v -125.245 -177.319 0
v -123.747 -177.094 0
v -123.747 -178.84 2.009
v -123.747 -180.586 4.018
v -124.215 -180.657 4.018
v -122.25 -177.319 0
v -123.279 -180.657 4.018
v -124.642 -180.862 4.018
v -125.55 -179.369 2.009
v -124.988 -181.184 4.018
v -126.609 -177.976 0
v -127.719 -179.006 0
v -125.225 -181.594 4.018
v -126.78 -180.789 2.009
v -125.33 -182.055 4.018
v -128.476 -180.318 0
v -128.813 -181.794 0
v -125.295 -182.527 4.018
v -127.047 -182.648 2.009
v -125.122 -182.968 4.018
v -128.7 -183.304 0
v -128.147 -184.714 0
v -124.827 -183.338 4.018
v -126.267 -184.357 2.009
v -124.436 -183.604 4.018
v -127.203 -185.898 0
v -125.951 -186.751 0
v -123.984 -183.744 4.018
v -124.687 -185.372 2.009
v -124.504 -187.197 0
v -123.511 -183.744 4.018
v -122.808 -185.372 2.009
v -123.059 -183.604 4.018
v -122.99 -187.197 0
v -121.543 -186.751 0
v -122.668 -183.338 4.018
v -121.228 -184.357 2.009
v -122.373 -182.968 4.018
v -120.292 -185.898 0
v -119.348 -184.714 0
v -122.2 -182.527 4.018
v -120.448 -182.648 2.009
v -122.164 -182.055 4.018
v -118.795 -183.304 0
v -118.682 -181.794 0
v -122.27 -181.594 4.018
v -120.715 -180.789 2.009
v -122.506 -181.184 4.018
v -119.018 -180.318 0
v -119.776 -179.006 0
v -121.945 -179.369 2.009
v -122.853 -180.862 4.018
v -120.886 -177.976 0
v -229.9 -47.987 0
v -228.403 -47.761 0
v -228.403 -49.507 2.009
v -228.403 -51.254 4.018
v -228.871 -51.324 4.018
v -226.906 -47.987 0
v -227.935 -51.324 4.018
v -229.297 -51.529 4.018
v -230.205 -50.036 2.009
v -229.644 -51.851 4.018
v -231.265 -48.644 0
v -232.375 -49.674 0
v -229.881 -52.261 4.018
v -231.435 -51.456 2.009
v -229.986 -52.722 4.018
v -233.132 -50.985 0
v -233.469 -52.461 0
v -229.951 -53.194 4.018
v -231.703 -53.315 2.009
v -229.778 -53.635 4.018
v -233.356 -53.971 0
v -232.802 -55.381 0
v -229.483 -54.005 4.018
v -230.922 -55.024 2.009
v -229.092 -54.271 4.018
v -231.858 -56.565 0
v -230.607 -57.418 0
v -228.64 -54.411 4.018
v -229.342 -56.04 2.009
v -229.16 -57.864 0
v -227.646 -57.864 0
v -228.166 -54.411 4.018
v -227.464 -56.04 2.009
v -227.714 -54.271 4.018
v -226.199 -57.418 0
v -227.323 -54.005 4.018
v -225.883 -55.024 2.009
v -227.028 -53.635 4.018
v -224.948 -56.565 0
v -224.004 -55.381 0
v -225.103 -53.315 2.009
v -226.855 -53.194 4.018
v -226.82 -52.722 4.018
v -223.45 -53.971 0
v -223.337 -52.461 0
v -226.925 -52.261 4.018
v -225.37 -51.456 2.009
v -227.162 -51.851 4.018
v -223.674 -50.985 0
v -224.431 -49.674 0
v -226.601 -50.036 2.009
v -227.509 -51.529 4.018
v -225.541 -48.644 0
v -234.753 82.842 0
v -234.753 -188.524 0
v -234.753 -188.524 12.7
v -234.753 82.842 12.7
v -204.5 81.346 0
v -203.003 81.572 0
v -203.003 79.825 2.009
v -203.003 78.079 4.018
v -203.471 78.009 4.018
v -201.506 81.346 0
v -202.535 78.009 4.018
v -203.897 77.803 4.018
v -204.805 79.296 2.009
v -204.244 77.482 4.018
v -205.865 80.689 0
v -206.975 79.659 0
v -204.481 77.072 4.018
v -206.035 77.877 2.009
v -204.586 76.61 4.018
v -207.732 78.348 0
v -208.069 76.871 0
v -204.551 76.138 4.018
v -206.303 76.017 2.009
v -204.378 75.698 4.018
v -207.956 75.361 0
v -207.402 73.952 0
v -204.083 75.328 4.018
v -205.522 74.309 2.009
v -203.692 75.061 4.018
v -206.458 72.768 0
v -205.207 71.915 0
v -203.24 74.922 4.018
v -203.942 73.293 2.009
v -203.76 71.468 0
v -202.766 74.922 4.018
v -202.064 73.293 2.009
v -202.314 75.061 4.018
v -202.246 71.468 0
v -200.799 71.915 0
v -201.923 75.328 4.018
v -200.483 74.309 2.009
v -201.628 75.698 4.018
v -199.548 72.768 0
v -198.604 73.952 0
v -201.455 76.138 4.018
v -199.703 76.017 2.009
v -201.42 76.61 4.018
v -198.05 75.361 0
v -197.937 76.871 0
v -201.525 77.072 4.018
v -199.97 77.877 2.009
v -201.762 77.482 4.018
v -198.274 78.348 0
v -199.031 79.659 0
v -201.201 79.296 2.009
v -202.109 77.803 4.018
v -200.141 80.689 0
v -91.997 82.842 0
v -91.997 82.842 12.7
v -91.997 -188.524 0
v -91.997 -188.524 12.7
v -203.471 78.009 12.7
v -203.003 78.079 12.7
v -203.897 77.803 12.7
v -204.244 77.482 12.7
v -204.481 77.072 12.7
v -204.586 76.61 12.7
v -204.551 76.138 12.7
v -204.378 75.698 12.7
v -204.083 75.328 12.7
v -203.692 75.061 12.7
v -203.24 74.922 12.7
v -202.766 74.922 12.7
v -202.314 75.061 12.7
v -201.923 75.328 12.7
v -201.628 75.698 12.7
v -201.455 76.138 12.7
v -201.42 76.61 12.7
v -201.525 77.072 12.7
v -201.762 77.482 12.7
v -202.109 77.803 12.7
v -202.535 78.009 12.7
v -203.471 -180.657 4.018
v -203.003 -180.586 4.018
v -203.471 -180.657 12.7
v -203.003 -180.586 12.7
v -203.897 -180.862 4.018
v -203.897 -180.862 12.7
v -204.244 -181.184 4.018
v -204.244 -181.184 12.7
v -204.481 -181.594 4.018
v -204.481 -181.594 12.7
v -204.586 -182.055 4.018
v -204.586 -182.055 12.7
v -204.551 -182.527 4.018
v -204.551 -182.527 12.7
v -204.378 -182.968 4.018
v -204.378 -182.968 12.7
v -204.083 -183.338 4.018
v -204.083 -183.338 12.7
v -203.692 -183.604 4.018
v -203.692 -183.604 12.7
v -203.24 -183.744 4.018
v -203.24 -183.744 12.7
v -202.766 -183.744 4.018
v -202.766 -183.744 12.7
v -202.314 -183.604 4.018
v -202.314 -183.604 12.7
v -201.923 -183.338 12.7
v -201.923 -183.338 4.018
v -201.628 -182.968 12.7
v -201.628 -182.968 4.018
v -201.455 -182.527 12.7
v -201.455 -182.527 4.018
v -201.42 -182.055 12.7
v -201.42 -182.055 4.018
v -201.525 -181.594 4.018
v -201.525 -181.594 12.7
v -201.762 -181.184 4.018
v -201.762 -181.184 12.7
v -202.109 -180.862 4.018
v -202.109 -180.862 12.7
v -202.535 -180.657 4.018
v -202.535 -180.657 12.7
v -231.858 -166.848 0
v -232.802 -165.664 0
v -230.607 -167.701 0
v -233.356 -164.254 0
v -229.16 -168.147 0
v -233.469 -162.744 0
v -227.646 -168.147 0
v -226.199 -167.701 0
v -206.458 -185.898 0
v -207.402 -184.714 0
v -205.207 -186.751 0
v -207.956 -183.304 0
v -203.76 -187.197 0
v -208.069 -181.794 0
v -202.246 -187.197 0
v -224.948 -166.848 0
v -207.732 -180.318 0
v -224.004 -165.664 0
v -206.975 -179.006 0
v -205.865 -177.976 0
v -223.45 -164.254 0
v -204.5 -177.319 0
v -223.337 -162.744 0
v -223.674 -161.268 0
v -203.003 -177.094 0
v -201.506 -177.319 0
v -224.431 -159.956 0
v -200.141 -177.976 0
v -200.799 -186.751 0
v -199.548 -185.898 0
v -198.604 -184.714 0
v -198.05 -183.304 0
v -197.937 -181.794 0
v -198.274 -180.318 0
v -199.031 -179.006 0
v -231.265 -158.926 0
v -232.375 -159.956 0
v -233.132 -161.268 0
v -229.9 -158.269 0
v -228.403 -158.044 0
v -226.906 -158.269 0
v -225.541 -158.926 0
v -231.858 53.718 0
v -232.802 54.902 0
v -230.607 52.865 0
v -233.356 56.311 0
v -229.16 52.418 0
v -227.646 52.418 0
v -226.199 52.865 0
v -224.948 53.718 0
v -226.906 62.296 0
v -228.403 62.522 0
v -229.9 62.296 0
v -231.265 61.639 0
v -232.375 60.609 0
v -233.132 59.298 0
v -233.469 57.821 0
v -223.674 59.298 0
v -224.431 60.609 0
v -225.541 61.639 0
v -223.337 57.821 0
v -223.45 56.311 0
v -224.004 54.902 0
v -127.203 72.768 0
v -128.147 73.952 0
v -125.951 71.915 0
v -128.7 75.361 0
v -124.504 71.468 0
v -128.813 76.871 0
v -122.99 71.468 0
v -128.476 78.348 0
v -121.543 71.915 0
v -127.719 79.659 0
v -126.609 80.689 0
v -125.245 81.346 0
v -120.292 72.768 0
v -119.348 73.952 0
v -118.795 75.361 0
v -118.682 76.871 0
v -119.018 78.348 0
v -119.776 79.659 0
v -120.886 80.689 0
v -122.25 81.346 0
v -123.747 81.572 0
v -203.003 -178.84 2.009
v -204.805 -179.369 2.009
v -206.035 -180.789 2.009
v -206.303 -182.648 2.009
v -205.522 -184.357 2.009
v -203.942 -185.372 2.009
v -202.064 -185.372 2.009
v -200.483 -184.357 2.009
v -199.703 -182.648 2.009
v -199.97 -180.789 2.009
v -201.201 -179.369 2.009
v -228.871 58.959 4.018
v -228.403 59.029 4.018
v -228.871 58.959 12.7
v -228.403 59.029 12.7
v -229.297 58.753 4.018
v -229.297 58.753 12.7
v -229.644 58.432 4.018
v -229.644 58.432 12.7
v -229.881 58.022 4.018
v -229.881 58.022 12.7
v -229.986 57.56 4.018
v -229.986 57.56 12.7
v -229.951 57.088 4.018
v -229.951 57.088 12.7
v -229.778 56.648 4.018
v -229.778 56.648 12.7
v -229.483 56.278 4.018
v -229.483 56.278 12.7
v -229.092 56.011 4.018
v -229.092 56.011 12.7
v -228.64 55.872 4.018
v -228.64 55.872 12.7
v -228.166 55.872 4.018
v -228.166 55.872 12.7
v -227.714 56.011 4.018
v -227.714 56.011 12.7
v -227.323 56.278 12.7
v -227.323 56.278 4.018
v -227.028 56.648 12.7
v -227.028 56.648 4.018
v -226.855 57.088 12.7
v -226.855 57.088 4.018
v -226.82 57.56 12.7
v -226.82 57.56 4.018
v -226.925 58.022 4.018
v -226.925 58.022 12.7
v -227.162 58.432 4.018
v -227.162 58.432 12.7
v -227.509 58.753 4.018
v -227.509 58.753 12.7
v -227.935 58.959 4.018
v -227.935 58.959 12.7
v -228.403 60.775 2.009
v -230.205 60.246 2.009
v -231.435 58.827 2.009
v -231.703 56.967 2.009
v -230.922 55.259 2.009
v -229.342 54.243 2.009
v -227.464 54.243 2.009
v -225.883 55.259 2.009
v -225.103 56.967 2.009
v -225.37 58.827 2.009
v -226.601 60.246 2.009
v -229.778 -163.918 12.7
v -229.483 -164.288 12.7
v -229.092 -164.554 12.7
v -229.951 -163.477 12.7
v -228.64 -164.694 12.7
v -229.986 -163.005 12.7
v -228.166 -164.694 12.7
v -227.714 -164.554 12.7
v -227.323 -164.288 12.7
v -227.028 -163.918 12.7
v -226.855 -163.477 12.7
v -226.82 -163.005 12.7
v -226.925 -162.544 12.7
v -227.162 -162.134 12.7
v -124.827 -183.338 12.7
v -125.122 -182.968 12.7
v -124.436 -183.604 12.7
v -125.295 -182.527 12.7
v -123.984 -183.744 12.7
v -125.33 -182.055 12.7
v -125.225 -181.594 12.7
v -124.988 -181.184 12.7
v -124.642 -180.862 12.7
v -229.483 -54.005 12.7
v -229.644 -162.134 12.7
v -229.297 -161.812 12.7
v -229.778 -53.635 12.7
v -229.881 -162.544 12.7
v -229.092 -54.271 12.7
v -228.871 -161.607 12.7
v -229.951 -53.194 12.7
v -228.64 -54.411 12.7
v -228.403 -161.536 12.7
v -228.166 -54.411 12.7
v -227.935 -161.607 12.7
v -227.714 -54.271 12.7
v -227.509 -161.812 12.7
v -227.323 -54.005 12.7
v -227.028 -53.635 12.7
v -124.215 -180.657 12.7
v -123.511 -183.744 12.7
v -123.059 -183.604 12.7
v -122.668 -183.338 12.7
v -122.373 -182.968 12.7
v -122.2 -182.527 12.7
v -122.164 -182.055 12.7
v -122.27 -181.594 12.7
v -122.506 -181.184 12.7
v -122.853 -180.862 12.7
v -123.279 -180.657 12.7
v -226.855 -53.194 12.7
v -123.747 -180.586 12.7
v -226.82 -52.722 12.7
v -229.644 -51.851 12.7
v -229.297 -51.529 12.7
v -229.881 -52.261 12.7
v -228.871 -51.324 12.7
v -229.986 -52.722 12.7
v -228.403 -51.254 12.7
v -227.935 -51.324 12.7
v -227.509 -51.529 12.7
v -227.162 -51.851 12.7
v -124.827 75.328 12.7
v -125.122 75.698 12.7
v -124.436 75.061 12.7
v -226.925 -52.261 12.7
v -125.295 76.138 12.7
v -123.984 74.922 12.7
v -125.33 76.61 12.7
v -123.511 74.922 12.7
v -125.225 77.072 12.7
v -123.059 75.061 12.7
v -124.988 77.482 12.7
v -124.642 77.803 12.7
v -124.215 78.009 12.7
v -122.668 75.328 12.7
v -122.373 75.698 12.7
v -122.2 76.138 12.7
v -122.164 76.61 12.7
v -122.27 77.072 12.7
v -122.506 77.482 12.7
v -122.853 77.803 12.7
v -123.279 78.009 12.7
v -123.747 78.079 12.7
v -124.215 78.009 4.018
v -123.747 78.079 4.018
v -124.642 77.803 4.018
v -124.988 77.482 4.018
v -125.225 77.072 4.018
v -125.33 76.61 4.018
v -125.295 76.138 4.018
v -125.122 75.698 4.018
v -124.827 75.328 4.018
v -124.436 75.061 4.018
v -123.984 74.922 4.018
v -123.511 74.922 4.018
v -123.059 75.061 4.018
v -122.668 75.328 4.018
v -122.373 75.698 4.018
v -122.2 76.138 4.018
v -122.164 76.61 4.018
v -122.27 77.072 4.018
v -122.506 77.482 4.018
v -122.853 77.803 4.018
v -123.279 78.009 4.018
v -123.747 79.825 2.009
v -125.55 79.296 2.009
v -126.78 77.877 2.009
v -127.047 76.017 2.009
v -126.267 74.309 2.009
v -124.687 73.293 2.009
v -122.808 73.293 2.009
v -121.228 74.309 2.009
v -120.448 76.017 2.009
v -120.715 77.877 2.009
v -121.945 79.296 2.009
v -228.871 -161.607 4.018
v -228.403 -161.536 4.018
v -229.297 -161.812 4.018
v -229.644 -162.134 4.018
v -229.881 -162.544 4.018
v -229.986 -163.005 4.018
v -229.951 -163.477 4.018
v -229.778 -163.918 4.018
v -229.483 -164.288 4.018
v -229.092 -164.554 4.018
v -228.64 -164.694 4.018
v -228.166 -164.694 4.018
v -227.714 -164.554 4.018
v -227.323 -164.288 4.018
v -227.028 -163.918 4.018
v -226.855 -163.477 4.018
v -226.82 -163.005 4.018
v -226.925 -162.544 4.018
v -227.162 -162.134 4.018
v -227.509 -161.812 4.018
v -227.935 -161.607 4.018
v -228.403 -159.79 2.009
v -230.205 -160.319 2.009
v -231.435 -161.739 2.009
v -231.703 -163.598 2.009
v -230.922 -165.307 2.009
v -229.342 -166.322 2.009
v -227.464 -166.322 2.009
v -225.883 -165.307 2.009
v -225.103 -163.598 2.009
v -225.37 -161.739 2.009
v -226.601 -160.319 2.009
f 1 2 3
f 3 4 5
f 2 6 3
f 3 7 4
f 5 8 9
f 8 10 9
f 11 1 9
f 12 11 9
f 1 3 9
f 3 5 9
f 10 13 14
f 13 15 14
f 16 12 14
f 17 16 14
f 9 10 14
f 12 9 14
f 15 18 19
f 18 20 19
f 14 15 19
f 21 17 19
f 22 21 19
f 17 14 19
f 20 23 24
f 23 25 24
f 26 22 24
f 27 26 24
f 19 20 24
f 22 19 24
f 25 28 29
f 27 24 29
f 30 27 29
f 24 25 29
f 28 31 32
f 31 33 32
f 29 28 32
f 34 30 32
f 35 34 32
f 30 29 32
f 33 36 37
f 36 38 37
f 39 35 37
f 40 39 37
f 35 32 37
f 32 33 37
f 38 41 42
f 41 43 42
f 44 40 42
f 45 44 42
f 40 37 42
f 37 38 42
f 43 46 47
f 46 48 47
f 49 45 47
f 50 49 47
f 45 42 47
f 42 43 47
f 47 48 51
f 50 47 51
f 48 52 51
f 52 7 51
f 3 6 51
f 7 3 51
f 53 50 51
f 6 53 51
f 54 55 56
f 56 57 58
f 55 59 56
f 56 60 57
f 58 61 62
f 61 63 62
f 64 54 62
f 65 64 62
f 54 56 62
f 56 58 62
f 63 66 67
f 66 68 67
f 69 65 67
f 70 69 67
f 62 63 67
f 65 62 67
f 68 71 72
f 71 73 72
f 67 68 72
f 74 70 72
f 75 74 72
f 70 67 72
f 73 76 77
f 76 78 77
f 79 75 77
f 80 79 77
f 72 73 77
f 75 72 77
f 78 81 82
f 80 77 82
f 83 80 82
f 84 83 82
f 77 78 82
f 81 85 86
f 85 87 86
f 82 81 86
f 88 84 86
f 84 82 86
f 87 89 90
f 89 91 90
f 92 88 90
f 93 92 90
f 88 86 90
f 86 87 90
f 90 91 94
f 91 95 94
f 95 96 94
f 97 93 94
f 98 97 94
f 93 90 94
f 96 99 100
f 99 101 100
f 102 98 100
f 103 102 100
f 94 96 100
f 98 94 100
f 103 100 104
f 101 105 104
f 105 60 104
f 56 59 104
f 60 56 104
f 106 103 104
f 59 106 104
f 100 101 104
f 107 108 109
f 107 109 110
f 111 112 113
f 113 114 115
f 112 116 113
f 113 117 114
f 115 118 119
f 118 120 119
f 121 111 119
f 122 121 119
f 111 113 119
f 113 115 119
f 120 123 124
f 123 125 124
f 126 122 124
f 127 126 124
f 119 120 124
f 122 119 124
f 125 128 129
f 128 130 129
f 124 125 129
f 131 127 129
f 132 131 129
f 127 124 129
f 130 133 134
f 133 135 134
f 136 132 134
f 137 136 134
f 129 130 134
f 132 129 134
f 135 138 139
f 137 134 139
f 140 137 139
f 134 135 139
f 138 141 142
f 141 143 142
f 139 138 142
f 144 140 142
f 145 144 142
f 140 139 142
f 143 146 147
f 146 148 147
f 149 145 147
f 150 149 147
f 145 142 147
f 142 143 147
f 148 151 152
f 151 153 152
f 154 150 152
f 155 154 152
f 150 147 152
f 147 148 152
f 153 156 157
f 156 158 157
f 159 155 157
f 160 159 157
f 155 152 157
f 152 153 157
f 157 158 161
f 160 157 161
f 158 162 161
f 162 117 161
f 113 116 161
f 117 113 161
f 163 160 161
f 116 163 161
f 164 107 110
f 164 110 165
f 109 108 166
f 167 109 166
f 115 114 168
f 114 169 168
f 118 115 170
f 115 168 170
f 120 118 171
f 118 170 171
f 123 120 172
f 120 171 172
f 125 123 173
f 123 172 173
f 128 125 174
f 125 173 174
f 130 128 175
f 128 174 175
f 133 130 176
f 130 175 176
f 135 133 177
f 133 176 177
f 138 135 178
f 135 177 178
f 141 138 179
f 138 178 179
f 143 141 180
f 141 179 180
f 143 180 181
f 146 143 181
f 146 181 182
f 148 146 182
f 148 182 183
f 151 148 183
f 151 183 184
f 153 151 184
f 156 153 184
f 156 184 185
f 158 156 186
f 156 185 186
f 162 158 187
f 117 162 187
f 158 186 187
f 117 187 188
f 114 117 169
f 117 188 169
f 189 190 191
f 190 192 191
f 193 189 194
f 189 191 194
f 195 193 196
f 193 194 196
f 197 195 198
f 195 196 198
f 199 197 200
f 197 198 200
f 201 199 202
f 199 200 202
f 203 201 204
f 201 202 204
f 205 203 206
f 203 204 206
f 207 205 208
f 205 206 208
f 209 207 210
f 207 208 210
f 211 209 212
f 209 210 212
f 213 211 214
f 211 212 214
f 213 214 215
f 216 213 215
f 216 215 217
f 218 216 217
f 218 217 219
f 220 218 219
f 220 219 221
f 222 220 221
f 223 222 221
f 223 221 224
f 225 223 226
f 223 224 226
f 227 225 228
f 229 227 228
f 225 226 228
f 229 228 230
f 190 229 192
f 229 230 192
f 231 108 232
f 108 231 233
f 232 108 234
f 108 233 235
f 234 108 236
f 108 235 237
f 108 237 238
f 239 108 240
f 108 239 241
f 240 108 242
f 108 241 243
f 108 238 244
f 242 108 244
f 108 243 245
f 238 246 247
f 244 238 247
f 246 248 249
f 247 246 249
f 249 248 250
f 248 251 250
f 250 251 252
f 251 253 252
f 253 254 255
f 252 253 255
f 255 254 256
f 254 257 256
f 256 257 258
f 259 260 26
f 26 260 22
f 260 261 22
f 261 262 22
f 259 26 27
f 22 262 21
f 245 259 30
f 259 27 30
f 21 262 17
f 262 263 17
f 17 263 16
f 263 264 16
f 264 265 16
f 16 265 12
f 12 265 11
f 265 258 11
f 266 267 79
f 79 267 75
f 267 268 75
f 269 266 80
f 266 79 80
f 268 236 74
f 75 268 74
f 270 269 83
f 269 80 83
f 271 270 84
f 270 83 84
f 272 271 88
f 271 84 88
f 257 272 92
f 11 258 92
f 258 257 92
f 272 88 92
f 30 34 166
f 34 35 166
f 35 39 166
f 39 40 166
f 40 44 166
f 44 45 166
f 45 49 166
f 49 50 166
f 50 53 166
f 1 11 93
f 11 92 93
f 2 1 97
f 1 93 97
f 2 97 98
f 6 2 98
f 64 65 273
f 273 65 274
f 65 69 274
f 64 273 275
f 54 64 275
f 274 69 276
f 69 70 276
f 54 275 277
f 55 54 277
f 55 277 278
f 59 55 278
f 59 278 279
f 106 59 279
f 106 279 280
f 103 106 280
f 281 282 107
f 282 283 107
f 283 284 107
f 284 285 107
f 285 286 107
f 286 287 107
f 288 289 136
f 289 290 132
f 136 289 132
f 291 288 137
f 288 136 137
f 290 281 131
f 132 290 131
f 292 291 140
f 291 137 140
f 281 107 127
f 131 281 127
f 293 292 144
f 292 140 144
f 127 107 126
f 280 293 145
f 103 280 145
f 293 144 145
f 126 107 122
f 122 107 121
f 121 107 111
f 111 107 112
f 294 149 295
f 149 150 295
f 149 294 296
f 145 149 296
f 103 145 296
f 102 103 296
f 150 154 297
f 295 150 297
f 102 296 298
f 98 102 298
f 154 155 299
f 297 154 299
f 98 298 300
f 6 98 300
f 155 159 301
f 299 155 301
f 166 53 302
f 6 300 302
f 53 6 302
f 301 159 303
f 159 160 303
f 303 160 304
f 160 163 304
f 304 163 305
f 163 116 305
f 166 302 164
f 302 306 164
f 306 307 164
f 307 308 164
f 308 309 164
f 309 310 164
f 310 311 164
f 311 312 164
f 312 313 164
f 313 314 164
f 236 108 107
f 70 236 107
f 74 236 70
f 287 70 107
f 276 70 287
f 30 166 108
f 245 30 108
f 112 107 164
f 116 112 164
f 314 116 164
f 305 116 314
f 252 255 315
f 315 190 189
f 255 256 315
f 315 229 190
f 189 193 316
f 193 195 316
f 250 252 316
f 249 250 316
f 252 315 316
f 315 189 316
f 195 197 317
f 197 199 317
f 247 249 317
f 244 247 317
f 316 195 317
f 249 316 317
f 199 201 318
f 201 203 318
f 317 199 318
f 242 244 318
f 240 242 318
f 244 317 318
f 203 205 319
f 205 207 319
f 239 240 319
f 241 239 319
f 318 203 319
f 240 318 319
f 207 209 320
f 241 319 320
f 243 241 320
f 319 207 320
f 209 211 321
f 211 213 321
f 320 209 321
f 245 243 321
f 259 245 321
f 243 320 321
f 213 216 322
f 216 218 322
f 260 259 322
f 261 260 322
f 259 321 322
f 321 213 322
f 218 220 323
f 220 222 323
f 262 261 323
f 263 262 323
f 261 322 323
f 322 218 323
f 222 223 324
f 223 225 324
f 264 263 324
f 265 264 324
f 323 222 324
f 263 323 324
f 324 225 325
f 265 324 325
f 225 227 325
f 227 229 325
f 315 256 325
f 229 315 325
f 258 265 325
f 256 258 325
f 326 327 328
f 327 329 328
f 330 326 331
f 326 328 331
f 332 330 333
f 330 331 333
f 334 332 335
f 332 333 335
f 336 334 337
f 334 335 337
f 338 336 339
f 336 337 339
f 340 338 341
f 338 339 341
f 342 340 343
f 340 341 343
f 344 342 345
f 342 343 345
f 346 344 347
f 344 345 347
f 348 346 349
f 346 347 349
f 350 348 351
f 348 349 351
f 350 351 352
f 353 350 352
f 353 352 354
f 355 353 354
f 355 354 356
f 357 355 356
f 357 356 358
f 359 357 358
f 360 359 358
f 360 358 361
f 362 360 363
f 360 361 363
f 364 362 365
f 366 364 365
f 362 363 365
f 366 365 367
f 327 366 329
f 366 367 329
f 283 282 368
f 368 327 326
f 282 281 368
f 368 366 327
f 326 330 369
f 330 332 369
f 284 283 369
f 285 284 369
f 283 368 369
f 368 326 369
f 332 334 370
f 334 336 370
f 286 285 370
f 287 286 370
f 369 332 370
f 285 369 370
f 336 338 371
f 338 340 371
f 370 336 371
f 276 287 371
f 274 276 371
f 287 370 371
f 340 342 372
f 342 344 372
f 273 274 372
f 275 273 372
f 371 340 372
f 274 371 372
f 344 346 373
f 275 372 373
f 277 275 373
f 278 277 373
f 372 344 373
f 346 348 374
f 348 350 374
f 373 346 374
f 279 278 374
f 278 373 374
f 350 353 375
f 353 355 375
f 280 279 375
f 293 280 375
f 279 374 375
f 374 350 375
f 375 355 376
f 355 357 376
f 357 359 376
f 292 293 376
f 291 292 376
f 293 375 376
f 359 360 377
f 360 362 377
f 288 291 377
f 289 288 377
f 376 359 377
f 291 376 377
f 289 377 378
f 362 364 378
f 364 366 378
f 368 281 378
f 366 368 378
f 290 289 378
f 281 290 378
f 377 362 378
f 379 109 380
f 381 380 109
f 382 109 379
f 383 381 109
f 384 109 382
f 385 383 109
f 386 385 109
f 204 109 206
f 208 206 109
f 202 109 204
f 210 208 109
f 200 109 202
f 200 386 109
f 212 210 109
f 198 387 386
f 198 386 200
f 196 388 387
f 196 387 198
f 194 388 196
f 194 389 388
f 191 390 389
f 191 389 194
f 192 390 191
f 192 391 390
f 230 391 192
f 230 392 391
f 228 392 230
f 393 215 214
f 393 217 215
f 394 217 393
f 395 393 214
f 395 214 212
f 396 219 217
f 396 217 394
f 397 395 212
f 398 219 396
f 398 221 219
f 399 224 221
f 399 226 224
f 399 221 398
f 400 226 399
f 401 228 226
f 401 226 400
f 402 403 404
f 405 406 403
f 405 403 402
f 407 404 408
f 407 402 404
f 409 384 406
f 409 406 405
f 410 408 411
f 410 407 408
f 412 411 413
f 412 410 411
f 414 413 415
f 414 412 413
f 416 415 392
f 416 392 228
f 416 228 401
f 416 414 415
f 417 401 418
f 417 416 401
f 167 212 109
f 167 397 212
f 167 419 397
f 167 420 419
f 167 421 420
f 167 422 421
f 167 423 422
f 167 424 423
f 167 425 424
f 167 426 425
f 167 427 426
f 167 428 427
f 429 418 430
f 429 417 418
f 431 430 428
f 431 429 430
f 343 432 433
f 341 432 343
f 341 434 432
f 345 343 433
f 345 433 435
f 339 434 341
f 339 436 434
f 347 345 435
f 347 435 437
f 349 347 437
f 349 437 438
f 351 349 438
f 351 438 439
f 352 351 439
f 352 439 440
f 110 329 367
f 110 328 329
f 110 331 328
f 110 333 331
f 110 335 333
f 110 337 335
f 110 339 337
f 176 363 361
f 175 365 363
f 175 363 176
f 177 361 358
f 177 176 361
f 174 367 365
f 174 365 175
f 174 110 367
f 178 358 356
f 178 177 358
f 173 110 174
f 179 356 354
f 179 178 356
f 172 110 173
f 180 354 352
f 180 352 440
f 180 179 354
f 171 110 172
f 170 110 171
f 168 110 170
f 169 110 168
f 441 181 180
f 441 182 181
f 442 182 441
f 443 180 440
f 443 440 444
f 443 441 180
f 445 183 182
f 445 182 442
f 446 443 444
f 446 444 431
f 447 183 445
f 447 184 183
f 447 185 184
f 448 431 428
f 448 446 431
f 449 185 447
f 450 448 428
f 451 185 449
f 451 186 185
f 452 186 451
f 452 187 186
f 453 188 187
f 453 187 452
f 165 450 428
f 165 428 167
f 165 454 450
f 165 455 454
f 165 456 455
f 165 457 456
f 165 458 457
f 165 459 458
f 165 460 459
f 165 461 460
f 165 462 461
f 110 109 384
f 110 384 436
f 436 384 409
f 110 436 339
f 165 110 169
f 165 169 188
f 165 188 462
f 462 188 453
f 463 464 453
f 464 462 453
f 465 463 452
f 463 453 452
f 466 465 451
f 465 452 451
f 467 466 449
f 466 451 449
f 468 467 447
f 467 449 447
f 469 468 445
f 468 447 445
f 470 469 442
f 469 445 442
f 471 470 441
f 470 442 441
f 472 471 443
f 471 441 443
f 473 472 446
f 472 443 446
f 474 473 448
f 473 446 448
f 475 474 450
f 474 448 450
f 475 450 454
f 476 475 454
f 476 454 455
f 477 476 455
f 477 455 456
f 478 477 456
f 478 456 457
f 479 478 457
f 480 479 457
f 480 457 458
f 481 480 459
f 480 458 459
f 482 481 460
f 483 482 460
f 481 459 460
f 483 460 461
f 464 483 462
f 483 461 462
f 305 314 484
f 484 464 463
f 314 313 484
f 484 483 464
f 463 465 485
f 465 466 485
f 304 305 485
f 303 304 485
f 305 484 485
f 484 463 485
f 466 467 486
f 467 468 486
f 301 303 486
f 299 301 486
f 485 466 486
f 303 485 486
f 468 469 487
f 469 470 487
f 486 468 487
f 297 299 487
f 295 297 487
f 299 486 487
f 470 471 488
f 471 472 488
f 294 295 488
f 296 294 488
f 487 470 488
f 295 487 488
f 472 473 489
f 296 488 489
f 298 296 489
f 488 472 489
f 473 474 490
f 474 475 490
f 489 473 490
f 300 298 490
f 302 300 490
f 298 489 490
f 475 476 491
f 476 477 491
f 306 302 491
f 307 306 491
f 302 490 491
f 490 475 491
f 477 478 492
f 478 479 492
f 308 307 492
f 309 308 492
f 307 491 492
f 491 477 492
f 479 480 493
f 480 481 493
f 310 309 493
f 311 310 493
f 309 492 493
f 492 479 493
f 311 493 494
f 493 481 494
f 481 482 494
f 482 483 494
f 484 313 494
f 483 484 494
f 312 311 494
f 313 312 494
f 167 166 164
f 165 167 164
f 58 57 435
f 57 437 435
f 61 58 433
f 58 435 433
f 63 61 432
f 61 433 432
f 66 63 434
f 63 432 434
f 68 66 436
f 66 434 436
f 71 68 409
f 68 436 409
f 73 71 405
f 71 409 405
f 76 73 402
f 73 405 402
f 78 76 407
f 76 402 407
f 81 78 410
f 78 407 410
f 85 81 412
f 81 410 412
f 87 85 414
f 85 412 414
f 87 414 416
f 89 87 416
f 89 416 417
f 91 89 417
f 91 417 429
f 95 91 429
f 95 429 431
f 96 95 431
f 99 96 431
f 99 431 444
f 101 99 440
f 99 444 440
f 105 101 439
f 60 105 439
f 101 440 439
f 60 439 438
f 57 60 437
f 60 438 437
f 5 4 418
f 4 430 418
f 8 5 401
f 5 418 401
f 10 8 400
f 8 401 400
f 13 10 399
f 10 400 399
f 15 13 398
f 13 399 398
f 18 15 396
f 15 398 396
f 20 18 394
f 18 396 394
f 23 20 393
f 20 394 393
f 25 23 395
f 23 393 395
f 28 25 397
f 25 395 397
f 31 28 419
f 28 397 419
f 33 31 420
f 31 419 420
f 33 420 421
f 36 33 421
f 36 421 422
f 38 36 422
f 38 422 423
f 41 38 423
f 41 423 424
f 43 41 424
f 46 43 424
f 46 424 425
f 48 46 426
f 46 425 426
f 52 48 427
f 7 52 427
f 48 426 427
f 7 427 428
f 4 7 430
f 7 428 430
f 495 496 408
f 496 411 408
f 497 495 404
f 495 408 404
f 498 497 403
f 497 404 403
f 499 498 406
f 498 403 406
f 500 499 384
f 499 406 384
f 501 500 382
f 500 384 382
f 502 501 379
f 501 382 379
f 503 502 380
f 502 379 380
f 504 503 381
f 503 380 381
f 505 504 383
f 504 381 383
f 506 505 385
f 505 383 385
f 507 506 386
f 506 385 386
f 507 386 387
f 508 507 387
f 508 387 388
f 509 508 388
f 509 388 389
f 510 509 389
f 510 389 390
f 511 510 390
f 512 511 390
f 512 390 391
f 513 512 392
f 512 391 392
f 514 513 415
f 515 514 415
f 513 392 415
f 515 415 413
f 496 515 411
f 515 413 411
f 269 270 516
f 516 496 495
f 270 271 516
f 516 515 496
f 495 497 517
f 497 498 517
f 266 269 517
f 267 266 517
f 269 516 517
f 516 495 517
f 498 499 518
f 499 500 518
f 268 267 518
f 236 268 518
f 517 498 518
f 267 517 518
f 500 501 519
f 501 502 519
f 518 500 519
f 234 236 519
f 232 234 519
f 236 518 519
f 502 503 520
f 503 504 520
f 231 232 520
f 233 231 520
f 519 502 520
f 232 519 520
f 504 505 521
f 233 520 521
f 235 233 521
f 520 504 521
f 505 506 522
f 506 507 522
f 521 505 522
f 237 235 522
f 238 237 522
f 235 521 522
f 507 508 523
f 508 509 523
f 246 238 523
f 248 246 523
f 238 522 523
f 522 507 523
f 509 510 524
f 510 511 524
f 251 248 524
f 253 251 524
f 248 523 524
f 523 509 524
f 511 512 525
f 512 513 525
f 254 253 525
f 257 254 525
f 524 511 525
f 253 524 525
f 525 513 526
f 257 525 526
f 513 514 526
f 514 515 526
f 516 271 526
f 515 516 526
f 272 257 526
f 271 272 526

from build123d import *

# Parameters (mm, degrees)
SKETCH1_W           = 142.755639788
SKETCH1_H           = 271.365530146
BOSS_EXTRUDE1_DEPTH = 12.7
HOLE1_D             = 3.175
HOLE1_DEPTH         = 31.75
HOLE1_CSINK_D       = 10.16
HOLE1_CSINK_ANGLE   = 82
HOLE1_TIP           = 0.953866233


with BuildPart() as part:
    # Sketch1 → Boss-Extrude1 (new body)
    with BuildSketch(Plane.XY):
        with Locations((-163.375147287, -52.841023691)):
            Rectangle(SKETCH1_W, SKETCH1_H)
    extrude(amount=BOSS_EXTRUDE1_DEPTH)

    # Hole1
    with Locations(Plane(origin=(181.039434513, -52.974999997, 0), x_dir=(0, -1, 0), z_dir=(0, 0, -1))):
        with Locations((129.198788767, 384.042401694), (-129.466741379, 384.042401694), (-129.466741379, 304.786761906), (-110.416741379, 409.442401694), (-0.133976306, 409.442401694), (110.148788767, 409.442401694), (129.198788767, 304.786761906)):
            CounterSinkHole(HOLE1_D / 2, HOLE1_CSINK_D / 2, depth=HOLE1_DEPTH, counter_sink_angle=HOLE1_CSINK_ANGLE)
            with Locations((0, 0, -(HOLE1_DEPTH + HOLE1_TIP / 2))):  # 118° drill point
                Cone(0, HOLE1_D / 2, HOLE1_TIP, mode=Mode.SUBTRACT)


solid = part.part
